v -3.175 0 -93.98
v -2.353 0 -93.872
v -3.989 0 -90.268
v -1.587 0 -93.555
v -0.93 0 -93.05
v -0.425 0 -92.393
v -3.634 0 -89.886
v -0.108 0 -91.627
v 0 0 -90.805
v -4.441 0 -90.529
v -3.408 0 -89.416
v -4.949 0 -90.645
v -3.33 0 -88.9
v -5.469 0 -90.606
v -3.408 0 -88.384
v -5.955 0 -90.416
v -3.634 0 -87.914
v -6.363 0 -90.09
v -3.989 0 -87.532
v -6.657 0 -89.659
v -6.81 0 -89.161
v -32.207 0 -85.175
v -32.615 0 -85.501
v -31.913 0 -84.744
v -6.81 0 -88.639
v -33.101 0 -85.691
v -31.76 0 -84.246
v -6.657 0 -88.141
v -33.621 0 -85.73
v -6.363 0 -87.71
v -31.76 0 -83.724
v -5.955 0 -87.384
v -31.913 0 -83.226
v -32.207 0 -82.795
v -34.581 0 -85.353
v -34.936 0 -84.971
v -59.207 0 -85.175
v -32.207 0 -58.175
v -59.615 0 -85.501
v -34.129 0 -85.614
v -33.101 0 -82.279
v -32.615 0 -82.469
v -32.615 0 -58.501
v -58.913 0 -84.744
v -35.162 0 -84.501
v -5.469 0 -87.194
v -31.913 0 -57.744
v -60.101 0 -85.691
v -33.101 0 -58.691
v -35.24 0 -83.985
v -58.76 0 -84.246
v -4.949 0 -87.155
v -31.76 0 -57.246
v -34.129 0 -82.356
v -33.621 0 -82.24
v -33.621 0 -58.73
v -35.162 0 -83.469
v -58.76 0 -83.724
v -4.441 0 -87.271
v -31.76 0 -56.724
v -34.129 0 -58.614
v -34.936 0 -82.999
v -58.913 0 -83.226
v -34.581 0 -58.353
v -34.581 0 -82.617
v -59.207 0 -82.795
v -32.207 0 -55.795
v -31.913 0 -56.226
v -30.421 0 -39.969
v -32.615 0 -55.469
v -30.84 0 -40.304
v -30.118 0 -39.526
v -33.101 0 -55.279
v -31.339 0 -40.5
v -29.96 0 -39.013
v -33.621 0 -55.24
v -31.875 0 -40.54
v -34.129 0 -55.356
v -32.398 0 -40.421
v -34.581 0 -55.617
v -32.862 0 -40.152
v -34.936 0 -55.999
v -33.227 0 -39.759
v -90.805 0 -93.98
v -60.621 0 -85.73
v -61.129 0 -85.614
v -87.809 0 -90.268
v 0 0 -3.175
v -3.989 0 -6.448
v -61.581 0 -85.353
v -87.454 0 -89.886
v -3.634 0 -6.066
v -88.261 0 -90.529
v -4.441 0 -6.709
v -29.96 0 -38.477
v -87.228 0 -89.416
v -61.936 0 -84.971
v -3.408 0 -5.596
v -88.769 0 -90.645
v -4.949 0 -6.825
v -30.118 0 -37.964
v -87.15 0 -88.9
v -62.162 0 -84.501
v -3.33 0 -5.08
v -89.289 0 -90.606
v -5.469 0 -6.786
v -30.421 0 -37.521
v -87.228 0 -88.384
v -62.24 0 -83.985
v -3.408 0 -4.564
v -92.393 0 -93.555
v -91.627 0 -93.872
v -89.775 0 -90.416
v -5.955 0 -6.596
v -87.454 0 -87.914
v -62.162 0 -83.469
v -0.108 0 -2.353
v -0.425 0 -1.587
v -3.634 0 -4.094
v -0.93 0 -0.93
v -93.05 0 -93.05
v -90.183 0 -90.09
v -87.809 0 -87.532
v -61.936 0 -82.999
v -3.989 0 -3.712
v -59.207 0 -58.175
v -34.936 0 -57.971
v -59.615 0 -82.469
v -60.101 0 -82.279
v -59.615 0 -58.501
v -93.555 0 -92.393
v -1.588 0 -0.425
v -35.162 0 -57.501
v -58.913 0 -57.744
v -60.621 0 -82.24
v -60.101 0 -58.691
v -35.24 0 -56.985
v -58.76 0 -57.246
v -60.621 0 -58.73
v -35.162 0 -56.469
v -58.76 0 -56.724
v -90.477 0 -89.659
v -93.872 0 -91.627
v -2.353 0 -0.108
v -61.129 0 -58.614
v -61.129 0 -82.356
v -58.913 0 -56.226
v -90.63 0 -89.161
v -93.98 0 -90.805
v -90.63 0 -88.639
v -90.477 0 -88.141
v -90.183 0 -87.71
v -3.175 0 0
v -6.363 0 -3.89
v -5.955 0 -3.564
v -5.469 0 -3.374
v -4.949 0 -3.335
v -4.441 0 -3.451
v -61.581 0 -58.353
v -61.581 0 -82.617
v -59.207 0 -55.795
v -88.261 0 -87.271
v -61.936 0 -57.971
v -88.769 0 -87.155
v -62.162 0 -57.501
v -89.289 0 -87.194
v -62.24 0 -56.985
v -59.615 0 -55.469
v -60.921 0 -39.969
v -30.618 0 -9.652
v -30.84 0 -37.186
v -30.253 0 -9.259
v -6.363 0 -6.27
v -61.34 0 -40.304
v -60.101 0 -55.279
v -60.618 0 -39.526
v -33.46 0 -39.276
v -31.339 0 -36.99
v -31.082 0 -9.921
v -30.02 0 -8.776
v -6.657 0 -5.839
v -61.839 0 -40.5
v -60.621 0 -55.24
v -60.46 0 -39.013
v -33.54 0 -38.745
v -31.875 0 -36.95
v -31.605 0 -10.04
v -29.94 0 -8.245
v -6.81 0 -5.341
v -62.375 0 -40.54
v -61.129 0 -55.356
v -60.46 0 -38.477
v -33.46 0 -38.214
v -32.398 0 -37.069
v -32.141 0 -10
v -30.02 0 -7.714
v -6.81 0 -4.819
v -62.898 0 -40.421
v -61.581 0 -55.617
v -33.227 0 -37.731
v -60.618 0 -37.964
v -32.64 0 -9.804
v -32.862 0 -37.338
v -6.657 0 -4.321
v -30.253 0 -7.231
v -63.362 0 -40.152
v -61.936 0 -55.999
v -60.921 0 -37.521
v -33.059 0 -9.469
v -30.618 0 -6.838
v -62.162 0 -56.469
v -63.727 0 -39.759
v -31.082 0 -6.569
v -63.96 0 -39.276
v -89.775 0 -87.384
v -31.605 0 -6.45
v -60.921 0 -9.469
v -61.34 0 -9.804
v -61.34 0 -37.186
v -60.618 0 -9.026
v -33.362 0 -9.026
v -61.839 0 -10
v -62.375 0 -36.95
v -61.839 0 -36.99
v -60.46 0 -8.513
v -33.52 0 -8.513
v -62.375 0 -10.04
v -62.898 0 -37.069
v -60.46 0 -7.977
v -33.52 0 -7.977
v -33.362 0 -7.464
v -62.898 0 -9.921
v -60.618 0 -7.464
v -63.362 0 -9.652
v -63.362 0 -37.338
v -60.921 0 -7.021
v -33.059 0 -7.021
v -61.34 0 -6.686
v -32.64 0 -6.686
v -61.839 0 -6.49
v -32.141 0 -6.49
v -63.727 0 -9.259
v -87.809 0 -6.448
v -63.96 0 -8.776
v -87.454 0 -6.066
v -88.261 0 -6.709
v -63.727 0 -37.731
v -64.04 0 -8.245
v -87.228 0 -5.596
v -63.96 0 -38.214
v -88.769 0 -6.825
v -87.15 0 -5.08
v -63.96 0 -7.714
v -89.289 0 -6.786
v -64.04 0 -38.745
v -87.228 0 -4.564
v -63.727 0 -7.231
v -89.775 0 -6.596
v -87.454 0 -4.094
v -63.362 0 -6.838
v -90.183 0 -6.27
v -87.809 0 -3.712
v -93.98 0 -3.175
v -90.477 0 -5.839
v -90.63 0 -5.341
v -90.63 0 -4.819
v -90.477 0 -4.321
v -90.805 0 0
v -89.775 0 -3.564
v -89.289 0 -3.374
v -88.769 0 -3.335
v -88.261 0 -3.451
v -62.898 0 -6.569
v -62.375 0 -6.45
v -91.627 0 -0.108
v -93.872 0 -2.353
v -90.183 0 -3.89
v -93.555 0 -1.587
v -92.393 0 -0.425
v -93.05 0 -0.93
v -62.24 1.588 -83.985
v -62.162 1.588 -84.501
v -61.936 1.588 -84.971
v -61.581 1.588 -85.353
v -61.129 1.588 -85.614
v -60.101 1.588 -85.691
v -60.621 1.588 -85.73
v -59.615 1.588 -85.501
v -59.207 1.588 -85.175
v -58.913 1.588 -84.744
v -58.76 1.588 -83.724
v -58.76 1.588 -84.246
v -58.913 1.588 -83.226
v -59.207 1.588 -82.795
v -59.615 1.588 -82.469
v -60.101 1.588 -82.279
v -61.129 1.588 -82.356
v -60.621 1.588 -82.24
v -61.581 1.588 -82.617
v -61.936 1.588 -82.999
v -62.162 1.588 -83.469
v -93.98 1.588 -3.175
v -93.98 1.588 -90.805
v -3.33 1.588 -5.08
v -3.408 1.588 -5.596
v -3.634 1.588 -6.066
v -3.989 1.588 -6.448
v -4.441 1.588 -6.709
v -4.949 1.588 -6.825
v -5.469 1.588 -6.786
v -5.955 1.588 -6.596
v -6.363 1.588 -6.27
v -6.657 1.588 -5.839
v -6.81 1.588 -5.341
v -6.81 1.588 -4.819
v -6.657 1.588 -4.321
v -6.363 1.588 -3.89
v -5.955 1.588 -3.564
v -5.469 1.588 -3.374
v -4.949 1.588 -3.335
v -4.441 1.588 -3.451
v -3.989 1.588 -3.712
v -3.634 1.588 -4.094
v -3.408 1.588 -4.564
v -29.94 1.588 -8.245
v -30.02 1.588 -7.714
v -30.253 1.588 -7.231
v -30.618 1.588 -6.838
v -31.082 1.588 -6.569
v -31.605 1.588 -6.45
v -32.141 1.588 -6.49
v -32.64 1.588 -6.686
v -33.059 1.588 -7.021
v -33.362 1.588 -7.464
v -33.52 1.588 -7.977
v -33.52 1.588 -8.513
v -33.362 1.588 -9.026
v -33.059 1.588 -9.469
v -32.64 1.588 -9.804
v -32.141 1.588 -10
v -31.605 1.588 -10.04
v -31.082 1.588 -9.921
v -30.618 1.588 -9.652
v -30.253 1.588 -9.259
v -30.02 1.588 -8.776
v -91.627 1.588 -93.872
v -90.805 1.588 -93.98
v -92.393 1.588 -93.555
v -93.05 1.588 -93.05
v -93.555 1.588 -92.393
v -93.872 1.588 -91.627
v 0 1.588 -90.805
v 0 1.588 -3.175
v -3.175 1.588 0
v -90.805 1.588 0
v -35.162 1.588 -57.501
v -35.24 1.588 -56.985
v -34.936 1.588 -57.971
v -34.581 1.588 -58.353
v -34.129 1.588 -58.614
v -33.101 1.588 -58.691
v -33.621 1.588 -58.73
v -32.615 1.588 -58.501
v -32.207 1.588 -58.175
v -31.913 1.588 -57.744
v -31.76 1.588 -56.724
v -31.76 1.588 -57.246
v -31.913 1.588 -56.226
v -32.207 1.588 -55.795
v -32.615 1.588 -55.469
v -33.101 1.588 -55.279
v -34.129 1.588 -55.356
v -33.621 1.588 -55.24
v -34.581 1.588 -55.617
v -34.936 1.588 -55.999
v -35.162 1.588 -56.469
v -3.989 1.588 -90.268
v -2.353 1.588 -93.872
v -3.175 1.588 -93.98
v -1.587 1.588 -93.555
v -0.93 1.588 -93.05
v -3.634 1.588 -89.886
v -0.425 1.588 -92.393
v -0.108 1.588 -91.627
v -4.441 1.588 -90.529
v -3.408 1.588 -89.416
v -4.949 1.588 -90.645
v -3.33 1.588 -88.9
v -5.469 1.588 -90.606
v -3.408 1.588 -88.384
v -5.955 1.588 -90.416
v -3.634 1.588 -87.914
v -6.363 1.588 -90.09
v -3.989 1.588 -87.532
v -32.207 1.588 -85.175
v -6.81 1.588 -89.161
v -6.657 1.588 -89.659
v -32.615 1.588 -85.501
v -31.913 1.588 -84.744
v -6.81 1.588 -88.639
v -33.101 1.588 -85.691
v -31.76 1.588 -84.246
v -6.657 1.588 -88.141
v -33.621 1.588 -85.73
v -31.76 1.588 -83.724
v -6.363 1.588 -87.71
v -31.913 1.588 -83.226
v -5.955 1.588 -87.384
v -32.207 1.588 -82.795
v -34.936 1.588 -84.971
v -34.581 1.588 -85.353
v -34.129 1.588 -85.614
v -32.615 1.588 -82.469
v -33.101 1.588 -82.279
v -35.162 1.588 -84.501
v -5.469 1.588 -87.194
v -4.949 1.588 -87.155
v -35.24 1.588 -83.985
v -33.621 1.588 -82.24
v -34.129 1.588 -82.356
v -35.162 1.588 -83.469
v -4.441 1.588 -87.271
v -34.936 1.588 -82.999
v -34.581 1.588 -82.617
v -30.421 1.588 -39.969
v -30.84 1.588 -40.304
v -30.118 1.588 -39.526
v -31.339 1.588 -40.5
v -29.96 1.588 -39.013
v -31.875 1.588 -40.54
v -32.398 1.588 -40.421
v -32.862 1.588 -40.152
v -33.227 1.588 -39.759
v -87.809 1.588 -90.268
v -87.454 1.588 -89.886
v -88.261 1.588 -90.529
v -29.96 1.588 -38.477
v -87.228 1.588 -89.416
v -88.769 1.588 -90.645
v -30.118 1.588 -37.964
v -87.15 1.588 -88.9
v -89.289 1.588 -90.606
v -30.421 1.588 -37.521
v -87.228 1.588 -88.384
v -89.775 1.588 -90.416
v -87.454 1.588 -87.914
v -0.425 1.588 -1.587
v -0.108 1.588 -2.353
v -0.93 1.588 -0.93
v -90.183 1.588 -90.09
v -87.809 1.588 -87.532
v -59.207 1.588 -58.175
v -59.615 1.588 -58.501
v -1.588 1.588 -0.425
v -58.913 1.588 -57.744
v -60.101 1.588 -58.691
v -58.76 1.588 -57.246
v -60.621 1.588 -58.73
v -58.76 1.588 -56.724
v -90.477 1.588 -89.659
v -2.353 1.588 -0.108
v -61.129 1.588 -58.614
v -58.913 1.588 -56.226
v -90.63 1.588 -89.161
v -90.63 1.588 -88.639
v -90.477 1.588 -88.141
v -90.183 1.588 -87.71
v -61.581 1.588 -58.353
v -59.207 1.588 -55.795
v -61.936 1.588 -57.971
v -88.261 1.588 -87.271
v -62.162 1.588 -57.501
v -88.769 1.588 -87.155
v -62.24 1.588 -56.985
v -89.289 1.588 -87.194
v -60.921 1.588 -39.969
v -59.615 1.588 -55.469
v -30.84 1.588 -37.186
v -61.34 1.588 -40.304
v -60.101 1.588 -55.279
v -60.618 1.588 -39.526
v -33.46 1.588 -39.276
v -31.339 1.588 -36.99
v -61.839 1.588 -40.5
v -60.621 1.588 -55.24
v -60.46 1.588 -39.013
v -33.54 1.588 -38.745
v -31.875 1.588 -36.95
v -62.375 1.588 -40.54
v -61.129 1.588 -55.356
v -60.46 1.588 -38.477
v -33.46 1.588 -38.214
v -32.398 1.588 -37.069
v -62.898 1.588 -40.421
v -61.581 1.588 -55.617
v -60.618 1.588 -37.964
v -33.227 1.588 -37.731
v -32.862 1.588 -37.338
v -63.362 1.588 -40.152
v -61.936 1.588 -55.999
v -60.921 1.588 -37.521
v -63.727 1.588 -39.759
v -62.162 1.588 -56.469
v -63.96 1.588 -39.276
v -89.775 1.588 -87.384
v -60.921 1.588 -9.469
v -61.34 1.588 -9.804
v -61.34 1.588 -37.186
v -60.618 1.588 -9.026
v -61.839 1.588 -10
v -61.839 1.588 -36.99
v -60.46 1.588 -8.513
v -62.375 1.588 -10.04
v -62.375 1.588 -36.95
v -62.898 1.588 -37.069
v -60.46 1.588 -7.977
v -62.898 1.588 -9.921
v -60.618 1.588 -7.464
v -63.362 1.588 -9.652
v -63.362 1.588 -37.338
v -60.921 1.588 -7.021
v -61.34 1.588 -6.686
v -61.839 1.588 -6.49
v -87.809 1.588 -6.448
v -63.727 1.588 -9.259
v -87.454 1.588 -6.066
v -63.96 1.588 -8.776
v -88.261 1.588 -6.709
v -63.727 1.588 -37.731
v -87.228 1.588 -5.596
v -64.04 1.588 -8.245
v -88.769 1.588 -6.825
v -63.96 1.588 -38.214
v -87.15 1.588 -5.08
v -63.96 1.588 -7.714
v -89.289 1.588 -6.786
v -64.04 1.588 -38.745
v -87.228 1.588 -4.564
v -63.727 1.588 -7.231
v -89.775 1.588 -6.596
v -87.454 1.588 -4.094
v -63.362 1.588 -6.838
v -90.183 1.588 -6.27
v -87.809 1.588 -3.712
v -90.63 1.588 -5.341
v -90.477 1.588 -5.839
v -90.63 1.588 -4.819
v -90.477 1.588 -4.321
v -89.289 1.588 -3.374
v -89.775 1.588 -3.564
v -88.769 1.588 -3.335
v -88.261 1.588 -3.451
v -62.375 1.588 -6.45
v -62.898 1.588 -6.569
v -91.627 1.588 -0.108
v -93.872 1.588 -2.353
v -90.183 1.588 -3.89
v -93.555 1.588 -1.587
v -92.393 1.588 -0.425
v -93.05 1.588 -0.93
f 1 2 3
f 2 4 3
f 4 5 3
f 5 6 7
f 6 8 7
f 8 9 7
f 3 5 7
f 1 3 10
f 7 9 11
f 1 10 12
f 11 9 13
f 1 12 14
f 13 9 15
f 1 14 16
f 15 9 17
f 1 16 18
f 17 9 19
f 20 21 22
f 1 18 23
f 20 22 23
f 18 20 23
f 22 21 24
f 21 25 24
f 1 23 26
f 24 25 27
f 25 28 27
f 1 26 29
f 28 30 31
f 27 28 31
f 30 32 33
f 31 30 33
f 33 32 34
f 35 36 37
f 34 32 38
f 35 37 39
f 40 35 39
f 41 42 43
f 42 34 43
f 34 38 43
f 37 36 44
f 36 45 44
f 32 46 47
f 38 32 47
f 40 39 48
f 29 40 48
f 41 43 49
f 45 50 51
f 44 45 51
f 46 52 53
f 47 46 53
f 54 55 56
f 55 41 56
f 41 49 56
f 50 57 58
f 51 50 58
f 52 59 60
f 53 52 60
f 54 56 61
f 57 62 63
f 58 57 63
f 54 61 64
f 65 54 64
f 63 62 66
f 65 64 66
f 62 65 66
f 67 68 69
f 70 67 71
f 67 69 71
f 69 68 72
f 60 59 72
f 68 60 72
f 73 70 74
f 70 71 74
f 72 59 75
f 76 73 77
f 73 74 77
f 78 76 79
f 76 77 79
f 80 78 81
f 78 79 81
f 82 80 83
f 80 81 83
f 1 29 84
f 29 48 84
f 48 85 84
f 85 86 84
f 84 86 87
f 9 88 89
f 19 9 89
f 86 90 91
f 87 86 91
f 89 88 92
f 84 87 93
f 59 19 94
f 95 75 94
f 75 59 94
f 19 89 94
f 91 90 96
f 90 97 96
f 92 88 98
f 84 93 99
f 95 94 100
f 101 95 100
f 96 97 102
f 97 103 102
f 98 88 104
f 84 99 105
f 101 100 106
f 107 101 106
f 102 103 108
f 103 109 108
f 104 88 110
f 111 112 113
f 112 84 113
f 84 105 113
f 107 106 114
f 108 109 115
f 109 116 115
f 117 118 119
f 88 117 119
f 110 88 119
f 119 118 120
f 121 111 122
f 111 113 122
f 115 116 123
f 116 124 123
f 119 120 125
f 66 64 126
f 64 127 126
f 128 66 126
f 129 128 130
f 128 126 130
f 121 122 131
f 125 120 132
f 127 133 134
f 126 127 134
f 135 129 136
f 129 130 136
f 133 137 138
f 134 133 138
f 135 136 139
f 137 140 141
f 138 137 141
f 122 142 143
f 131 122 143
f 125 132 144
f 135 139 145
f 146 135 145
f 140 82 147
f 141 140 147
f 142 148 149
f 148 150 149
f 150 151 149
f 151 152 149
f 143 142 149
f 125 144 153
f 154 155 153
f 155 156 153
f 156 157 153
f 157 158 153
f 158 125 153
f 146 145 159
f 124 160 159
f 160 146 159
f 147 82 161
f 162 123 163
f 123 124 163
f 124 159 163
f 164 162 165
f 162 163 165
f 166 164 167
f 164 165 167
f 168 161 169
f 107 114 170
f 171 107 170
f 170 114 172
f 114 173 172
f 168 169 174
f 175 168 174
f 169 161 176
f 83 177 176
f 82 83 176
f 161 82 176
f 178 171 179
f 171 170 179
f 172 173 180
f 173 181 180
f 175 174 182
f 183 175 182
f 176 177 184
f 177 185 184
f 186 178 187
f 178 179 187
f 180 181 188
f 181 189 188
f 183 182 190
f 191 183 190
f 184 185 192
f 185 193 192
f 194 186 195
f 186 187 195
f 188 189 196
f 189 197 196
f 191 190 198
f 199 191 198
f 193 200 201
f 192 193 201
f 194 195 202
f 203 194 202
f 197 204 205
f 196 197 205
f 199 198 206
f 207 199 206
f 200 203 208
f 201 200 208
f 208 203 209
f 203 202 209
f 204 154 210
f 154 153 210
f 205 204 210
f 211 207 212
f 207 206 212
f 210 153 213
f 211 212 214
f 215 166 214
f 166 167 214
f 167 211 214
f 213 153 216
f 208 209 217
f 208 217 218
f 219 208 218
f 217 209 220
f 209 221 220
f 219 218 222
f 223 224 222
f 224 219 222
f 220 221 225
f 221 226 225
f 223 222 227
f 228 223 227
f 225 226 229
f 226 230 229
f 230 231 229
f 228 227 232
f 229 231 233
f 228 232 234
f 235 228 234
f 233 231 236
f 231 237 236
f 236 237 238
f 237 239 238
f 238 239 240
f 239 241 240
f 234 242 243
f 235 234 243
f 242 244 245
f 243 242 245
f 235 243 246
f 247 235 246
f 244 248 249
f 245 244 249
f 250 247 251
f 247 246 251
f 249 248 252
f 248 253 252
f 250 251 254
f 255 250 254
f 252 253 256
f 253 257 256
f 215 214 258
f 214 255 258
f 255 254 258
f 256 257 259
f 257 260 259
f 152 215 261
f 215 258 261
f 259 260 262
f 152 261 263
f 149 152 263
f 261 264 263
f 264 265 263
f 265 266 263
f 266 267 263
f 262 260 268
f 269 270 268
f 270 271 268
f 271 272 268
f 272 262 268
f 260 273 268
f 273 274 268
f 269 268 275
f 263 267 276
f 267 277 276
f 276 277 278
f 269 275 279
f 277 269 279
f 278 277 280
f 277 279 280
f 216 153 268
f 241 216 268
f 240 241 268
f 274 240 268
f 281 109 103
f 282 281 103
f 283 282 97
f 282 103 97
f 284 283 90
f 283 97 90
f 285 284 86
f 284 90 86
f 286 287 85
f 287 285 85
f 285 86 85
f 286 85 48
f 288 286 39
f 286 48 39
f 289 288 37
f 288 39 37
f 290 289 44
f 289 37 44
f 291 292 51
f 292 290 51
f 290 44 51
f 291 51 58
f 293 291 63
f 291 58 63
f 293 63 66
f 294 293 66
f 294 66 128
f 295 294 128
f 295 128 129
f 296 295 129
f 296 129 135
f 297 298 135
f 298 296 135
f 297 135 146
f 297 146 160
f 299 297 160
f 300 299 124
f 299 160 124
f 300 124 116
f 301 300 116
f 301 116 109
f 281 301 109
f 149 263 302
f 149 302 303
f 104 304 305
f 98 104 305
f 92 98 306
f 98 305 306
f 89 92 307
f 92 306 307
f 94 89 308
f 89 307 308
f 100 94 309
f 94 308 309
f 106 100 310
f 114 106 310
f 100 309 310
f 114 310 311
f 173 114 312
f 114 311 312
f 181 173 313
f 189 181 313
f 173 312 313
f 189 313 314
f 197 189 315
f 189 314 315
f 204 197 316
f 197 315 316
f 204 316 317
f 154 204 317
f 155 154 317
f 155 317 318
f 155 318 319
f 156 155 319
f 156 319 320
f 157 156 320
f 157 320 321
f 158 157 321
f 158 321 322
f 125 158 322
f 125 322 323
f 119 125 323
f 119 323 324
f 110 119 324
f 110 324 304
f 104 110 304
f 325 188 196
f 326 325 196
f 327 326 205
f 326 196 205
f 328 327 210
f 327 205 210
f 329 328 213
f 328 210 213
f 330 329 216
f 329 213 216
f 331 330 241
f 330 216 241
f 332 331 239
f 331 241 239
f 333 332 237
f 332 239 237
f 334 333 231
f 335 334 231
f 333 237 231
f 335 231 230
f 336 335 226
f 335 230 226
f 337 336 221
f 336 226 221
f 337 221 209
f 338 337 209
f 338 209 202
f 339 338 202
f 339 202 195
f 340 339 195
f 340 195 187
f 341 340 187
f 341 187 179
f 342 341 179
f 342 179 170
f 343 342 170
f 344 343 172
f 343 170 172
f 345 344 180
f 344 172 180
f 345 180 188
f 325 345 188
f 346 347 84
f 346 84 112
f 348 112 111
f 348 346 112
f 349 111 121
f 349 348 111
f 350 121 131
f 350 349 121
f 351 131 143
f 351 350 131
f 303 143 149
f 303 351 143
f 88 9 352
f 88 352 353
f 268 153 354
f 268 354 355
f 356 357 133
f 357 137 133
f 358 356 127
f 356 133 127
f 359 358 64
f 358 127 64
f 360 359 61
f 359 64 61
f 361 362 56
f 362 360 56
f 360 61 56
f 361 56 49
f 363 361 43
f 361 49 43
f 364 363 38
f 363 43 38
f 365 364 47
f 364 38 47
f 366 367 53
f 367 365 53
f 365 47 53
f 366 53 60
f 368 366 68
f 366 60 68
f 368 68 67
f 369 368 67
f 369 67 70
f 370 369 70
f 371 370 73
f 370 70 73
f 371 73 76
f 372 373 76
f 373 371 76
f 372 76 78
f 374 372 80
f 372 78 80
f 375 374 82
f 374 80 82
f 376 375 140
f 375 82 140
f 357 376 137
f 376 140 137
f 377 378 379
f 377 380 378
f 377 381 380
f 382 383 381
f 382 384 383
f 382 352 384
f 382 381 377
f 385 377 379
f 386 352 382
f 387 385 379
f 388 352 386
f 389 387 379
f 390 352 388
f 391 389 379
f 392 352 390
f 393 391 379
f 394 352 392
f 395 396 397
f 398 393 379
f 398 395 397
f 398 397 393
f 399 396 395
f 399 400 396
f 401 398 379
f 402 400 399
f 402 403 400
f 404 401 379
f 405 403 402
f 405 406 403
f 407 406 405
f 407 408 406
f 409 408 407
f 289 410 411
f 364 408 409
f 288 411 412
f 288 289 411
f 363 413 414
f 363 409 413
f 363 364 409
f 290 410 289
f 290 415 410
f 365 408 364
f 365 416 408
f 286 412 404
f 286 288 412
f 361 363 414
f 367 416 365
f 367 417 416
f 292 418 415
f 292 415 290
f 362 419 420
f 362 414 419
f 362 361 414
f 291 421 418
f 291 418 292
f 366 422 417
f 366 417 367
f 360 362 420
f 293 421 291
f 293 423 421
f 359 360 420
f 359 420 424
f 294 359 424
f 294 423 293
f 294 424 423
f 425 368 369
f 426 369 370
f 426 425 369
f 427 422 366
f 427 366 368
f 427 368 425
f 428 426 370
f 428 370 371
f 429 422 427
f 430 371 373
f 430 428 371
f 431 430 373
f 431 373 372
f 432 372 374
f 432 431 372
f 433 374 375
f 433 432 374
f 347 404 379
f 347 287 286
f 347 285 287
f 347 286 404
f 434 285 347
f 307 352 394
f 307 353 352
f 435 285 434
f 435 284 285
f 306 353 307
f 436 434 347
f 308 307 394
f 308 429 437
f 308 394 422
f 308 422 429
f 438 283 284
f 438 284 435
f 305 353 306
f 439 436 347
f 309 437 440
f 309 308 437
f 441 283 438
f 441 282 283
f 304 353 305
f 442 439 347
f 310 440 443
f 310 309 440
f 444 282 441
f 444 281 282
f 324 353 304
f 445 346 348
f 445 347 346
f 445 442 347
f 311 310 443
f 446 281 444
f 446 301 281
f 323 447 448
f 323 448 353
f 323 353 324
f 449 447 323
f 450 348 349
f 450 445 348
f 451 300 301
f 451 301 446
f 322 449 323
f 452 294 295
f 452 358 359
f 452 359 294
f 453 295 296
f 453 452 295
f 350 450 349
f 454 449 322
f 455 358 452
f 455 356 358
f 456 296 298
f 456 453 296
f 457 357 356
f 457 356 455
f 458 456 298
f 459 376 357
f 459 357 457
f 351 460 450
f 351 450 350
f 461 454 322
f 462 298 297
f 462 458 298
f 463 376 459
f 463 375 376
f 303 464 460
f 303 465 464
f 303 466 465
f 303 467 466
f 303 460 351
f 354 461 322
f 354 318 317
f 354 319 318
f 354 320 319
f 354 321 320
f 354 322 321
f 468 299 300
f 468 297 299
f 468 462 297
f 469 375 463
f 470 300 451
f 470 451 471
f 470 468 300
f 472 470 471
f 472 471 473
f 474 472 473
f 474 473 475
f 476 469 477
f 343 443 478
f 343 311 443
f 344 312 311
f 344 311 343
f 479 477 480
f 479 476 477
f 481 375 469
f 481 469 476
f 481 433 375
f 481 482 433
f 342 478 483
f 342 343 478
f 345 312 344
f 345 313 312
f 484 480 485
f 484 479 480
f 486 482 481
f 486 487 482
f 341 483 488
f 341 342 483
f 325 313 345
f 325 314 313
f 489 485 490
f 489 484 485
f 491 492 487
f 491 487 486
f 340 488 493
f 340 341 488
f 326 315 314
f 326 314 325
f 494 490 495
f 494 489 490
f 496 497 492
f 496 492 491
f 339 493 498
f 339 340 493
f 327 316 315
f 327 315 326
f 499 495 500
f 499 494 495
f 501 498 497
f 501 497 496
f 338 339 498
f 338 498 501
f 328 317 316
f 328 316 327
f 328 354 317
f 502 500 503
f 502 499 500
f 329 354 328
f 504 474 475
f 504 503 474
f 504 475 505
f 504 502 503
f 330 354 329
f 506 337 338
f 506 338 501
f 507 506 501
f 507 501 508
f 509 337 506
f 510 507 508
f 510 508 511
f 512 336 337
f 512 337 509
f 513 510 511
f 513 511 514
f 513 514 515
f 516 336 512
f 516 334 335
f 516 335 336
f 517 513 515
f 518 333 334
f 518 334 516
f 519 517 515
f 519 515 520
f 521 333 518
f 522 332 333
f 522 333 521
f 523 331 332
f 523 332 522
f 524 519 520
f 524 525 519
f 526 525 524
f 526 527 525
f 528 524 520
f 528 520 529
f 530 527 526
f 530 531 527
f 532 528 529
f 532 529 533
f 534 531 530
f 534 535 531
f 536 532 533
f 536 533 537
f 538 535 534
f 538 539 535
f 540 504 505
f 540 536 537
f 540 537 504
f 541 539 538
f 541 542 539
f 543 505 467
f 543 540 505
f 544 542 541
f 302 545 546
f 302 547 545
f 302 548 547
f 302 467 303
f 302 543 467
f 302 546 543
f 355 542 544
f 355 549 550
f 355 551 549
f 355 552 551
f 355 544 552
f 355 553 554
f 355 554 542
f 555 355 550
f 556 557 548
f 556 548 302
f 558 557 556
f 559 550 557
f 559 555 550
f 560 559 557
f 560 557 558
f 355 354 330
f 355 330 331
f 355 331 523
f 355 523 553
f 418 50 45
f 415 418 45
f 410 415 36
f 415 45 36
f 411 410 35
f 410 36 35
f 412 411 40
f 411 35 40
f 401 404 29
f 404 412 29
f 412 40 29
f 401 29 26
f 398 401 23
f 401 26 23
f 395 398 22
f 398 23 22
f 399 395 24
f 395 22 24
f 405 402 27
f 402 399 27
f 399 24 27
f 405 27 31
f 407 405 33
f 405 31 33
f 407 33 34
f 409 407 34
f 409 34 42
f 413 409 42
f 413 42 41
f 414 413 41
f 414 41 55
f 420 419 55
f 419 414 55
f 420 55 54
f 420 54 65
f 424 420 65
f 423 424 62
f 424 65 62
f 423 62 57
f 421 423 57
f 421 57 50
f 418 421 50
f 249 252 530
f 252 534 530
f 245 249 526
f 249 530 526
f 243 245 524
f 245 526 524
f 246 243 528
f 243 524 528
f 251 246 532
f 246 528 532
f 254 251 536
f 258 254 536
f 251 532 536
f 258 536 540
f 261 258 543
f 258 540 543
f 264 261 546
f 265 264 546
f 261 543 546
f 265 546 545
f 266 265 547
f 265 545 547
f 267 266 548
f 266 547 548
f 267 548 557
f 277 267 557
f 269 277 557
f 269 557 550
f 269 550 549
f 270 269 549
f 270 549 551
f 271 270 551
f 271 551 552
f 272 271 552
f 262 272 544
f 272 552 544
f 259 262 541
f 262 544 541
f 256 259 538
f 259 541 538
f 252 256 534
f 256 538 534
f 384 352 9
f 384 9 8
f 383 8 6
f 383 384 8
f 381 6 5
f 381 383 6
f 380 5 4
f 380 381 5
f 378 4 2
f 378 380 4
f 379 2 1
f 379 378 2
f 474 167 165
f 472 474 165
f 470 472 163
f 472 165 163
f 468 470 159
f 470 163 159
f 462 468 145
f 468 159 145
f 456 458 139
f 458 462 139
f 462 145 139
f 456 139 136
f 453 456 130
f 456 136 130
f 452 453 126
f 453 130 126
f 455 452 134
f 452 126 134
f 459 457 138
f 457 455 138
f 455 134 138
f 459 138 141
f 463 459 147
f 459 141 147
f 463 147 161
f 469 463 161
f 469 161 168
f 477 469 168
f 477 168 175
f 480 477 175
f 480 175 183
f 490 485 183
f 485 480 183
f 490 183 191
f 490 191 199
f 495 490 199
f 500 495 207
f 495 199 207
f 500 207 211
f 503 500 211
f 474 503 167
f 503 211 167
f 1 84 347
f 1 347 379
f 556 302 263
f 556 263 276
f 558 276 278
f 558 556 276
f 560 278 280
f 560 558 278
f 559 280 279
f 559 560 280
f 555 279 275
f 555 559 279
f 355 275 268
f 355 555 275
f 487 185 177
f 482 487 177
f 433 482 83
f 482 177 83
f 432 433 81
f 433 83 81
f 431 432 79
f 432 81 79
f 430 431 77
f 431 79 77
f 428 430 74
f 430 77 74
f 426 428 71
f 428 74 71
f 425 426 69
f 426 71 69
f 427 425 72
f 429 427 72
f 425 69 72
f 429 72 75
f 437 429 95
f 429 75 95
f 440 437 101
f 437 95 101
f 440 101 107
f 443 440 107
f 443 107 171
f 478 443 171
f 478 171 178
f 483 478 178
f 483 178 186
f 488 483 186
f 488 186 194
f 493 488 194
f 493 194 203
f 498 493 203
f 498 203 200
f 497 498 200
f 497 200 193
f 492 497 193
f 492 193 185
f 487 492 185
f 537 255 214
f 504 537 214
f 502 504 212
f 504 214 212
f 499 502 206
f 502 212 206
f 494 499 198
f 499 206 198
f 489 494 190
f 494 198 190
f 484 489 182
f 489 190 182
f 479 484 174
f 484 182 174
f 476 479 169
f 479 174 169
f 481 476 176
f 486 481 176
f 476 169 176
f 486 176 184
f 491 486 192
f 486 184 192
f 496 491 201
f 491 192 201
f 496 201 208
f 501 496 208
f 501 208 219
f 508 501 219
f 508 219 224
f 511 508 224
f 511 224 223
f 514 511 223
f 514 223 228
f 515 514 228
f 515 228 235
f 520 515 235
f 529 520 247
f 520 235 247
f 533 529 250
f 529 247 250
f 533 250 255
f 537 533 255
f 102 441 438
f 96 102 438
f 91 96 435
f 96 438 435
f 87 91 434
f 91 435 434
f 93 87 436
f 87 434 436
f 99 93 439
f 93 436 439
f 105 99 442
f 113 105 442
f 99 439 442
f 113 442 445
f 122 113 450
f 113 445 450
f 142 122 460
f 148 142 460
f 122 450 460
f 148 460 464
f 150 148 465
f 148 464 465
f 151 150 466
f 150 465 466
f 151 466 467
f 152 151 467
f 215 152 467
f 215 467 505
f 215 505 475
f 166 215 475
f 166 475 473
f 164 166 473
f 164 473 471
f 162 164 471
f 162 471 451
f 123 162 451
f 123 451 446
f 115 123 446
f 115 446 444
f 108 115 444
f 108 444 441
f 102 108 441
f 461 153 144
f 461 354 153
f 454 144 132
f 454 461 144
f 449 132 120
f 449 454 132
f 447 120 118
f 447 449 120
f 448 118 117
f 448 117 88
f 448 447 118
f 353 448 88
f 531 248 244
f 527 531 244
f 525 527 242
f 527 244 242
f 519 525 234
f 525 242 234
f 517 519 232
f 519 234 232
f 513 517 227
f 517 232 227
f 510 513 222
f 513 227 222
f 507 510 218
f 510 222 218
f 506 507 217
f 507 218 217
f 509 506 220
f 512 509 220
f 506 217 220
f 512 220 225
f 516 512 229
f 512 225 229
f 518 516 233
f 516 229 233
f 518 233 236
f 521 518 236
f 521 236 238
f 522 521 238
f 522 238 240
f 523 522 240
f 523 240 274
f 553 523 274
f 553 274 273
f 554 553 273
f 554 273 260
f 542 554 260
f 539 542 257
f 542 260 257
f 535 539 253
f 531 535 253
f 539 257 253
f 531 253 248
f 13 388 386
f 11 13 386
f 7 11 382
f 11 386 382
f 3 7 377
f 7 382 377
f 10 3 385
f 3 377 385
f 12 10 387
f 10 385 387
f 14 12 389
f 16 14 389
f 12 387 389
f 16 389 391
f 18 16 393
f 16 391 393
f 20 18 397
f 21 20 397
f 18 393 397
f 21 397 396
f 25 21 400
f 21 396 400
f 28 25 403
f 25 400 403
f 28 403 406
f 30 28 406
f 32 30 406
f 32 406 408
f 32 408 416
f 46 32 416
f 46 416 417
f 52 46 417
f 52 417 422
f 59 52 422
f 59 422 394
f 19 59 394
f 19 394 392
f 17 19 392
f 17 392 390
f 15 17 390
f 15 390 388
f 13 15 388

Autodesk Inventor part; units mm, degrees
ref_plane "YZ Plane" through (0, 0, 0) normal (1, 0, 0) x (0, 1, 0)
ref_plane "XZ Plane" through (0, 0, 0) normal (0, 1, 0) x (-1, 0, 0)
ref_plane "XY Plane" through (0, 0, 0) normal (0, 0, 1) x (1, 0, 0)
sketch "Sketch1" plane through (0, 0, 0) normal (0, 1, 0) x (-1, 0, 0)
  line L0 (0, 0) -> (93.98, 0)
  line L1 (93.98, 0) -> (93.98, -93.98)
  line L2 (93.98, -93.98) -> (0, -93.98)
  line L3 (0, -93.98) -> (0, 0)
  line L4 (0, -93.98) -> (12.7, -93.98)
  line L5 (93.98, -93.98) -> (81.28, -93.98)
  line L6 (12.7, -93.98) -> (78.74, -93.98)
  line L7 (12.7, -93.98) -> (81.28, -93.98)
  arc A0 (33.54, -38.745) -> (29.94, -38.745) centre (31.74, -38.745) ccw
  circle A1 centre (31.74, -38.745) radius 1.8
  arc A2 (29.94, -8.245) -> (33.54, -8.245) centre (31.74, -8.245) ccw
  circle A3 centre (31.74, -8.245) radius 1.8
  arc A4 (64.04, -38.745) -> (60.44, -38.745) centre (62.24, -38.745) ccw
  circle A5 centre (62.24, -38.745) radius 1.8
  arc A6 (60.44, -8.245) -> (64.04, -8.245) centre (62.24, -8.245) ccw
  circle A7 centre (62.24, -8.245) radius 1.8
  line L8 (0, -93.98) -> (12.7, -93.98)
  line L9 (93.98, -93.98) -> (81.28, -93.98)
  line L10 (0, 0) -> (0, -46.99)
  line L11 (0, -46.99) -> (0, -93.98)
  circle A8 centre (60.49, -56.985) radius 1.75
  circle A9 centre (60.49, -83.985) radius 1.75
  circle A10 centre (33.49, -56.985) radius 1.75
  circle A11 centre (33.49, -83.985) radius 1.75
extrude "Extrusion5" add sketch "Sketch1" along normal blind 1.5875
fillet "Fillet2" radius 3.175 4 edges at (0, 0.7937, 0) (0, 0.7937, -93.98) (-93.98, 0.7937, 0) (-93.98, 0.7937, -93.98)
sketch "Sketch4" plane through (0, 1.5875, 0) normal (0, 1, 0) x (1, 0, 0)
  line L0 (-3.175, 93.98) -> (-90.805, 93.98) projected
  circle A0 centre (-88.9, 5.08) radius 1.75
  circle A1 centre (-88.9, 88.9) radius 1.75
  circle A2 centre (-5.08, 5.08) radius 1.75
  circle A3 centre (-5.08, 88.9) radius 1.75
  point P0 (0, 0)
  dimension "d37" = 3.5
  dimension "d38" = 3.5
  dimension "d39" = 3.5
  dimension "d40" = 3.5
extrude "Extrusion6" cut sketch "Sketch4" against normal blind 1.5875
properties part number "bottomPlate"
